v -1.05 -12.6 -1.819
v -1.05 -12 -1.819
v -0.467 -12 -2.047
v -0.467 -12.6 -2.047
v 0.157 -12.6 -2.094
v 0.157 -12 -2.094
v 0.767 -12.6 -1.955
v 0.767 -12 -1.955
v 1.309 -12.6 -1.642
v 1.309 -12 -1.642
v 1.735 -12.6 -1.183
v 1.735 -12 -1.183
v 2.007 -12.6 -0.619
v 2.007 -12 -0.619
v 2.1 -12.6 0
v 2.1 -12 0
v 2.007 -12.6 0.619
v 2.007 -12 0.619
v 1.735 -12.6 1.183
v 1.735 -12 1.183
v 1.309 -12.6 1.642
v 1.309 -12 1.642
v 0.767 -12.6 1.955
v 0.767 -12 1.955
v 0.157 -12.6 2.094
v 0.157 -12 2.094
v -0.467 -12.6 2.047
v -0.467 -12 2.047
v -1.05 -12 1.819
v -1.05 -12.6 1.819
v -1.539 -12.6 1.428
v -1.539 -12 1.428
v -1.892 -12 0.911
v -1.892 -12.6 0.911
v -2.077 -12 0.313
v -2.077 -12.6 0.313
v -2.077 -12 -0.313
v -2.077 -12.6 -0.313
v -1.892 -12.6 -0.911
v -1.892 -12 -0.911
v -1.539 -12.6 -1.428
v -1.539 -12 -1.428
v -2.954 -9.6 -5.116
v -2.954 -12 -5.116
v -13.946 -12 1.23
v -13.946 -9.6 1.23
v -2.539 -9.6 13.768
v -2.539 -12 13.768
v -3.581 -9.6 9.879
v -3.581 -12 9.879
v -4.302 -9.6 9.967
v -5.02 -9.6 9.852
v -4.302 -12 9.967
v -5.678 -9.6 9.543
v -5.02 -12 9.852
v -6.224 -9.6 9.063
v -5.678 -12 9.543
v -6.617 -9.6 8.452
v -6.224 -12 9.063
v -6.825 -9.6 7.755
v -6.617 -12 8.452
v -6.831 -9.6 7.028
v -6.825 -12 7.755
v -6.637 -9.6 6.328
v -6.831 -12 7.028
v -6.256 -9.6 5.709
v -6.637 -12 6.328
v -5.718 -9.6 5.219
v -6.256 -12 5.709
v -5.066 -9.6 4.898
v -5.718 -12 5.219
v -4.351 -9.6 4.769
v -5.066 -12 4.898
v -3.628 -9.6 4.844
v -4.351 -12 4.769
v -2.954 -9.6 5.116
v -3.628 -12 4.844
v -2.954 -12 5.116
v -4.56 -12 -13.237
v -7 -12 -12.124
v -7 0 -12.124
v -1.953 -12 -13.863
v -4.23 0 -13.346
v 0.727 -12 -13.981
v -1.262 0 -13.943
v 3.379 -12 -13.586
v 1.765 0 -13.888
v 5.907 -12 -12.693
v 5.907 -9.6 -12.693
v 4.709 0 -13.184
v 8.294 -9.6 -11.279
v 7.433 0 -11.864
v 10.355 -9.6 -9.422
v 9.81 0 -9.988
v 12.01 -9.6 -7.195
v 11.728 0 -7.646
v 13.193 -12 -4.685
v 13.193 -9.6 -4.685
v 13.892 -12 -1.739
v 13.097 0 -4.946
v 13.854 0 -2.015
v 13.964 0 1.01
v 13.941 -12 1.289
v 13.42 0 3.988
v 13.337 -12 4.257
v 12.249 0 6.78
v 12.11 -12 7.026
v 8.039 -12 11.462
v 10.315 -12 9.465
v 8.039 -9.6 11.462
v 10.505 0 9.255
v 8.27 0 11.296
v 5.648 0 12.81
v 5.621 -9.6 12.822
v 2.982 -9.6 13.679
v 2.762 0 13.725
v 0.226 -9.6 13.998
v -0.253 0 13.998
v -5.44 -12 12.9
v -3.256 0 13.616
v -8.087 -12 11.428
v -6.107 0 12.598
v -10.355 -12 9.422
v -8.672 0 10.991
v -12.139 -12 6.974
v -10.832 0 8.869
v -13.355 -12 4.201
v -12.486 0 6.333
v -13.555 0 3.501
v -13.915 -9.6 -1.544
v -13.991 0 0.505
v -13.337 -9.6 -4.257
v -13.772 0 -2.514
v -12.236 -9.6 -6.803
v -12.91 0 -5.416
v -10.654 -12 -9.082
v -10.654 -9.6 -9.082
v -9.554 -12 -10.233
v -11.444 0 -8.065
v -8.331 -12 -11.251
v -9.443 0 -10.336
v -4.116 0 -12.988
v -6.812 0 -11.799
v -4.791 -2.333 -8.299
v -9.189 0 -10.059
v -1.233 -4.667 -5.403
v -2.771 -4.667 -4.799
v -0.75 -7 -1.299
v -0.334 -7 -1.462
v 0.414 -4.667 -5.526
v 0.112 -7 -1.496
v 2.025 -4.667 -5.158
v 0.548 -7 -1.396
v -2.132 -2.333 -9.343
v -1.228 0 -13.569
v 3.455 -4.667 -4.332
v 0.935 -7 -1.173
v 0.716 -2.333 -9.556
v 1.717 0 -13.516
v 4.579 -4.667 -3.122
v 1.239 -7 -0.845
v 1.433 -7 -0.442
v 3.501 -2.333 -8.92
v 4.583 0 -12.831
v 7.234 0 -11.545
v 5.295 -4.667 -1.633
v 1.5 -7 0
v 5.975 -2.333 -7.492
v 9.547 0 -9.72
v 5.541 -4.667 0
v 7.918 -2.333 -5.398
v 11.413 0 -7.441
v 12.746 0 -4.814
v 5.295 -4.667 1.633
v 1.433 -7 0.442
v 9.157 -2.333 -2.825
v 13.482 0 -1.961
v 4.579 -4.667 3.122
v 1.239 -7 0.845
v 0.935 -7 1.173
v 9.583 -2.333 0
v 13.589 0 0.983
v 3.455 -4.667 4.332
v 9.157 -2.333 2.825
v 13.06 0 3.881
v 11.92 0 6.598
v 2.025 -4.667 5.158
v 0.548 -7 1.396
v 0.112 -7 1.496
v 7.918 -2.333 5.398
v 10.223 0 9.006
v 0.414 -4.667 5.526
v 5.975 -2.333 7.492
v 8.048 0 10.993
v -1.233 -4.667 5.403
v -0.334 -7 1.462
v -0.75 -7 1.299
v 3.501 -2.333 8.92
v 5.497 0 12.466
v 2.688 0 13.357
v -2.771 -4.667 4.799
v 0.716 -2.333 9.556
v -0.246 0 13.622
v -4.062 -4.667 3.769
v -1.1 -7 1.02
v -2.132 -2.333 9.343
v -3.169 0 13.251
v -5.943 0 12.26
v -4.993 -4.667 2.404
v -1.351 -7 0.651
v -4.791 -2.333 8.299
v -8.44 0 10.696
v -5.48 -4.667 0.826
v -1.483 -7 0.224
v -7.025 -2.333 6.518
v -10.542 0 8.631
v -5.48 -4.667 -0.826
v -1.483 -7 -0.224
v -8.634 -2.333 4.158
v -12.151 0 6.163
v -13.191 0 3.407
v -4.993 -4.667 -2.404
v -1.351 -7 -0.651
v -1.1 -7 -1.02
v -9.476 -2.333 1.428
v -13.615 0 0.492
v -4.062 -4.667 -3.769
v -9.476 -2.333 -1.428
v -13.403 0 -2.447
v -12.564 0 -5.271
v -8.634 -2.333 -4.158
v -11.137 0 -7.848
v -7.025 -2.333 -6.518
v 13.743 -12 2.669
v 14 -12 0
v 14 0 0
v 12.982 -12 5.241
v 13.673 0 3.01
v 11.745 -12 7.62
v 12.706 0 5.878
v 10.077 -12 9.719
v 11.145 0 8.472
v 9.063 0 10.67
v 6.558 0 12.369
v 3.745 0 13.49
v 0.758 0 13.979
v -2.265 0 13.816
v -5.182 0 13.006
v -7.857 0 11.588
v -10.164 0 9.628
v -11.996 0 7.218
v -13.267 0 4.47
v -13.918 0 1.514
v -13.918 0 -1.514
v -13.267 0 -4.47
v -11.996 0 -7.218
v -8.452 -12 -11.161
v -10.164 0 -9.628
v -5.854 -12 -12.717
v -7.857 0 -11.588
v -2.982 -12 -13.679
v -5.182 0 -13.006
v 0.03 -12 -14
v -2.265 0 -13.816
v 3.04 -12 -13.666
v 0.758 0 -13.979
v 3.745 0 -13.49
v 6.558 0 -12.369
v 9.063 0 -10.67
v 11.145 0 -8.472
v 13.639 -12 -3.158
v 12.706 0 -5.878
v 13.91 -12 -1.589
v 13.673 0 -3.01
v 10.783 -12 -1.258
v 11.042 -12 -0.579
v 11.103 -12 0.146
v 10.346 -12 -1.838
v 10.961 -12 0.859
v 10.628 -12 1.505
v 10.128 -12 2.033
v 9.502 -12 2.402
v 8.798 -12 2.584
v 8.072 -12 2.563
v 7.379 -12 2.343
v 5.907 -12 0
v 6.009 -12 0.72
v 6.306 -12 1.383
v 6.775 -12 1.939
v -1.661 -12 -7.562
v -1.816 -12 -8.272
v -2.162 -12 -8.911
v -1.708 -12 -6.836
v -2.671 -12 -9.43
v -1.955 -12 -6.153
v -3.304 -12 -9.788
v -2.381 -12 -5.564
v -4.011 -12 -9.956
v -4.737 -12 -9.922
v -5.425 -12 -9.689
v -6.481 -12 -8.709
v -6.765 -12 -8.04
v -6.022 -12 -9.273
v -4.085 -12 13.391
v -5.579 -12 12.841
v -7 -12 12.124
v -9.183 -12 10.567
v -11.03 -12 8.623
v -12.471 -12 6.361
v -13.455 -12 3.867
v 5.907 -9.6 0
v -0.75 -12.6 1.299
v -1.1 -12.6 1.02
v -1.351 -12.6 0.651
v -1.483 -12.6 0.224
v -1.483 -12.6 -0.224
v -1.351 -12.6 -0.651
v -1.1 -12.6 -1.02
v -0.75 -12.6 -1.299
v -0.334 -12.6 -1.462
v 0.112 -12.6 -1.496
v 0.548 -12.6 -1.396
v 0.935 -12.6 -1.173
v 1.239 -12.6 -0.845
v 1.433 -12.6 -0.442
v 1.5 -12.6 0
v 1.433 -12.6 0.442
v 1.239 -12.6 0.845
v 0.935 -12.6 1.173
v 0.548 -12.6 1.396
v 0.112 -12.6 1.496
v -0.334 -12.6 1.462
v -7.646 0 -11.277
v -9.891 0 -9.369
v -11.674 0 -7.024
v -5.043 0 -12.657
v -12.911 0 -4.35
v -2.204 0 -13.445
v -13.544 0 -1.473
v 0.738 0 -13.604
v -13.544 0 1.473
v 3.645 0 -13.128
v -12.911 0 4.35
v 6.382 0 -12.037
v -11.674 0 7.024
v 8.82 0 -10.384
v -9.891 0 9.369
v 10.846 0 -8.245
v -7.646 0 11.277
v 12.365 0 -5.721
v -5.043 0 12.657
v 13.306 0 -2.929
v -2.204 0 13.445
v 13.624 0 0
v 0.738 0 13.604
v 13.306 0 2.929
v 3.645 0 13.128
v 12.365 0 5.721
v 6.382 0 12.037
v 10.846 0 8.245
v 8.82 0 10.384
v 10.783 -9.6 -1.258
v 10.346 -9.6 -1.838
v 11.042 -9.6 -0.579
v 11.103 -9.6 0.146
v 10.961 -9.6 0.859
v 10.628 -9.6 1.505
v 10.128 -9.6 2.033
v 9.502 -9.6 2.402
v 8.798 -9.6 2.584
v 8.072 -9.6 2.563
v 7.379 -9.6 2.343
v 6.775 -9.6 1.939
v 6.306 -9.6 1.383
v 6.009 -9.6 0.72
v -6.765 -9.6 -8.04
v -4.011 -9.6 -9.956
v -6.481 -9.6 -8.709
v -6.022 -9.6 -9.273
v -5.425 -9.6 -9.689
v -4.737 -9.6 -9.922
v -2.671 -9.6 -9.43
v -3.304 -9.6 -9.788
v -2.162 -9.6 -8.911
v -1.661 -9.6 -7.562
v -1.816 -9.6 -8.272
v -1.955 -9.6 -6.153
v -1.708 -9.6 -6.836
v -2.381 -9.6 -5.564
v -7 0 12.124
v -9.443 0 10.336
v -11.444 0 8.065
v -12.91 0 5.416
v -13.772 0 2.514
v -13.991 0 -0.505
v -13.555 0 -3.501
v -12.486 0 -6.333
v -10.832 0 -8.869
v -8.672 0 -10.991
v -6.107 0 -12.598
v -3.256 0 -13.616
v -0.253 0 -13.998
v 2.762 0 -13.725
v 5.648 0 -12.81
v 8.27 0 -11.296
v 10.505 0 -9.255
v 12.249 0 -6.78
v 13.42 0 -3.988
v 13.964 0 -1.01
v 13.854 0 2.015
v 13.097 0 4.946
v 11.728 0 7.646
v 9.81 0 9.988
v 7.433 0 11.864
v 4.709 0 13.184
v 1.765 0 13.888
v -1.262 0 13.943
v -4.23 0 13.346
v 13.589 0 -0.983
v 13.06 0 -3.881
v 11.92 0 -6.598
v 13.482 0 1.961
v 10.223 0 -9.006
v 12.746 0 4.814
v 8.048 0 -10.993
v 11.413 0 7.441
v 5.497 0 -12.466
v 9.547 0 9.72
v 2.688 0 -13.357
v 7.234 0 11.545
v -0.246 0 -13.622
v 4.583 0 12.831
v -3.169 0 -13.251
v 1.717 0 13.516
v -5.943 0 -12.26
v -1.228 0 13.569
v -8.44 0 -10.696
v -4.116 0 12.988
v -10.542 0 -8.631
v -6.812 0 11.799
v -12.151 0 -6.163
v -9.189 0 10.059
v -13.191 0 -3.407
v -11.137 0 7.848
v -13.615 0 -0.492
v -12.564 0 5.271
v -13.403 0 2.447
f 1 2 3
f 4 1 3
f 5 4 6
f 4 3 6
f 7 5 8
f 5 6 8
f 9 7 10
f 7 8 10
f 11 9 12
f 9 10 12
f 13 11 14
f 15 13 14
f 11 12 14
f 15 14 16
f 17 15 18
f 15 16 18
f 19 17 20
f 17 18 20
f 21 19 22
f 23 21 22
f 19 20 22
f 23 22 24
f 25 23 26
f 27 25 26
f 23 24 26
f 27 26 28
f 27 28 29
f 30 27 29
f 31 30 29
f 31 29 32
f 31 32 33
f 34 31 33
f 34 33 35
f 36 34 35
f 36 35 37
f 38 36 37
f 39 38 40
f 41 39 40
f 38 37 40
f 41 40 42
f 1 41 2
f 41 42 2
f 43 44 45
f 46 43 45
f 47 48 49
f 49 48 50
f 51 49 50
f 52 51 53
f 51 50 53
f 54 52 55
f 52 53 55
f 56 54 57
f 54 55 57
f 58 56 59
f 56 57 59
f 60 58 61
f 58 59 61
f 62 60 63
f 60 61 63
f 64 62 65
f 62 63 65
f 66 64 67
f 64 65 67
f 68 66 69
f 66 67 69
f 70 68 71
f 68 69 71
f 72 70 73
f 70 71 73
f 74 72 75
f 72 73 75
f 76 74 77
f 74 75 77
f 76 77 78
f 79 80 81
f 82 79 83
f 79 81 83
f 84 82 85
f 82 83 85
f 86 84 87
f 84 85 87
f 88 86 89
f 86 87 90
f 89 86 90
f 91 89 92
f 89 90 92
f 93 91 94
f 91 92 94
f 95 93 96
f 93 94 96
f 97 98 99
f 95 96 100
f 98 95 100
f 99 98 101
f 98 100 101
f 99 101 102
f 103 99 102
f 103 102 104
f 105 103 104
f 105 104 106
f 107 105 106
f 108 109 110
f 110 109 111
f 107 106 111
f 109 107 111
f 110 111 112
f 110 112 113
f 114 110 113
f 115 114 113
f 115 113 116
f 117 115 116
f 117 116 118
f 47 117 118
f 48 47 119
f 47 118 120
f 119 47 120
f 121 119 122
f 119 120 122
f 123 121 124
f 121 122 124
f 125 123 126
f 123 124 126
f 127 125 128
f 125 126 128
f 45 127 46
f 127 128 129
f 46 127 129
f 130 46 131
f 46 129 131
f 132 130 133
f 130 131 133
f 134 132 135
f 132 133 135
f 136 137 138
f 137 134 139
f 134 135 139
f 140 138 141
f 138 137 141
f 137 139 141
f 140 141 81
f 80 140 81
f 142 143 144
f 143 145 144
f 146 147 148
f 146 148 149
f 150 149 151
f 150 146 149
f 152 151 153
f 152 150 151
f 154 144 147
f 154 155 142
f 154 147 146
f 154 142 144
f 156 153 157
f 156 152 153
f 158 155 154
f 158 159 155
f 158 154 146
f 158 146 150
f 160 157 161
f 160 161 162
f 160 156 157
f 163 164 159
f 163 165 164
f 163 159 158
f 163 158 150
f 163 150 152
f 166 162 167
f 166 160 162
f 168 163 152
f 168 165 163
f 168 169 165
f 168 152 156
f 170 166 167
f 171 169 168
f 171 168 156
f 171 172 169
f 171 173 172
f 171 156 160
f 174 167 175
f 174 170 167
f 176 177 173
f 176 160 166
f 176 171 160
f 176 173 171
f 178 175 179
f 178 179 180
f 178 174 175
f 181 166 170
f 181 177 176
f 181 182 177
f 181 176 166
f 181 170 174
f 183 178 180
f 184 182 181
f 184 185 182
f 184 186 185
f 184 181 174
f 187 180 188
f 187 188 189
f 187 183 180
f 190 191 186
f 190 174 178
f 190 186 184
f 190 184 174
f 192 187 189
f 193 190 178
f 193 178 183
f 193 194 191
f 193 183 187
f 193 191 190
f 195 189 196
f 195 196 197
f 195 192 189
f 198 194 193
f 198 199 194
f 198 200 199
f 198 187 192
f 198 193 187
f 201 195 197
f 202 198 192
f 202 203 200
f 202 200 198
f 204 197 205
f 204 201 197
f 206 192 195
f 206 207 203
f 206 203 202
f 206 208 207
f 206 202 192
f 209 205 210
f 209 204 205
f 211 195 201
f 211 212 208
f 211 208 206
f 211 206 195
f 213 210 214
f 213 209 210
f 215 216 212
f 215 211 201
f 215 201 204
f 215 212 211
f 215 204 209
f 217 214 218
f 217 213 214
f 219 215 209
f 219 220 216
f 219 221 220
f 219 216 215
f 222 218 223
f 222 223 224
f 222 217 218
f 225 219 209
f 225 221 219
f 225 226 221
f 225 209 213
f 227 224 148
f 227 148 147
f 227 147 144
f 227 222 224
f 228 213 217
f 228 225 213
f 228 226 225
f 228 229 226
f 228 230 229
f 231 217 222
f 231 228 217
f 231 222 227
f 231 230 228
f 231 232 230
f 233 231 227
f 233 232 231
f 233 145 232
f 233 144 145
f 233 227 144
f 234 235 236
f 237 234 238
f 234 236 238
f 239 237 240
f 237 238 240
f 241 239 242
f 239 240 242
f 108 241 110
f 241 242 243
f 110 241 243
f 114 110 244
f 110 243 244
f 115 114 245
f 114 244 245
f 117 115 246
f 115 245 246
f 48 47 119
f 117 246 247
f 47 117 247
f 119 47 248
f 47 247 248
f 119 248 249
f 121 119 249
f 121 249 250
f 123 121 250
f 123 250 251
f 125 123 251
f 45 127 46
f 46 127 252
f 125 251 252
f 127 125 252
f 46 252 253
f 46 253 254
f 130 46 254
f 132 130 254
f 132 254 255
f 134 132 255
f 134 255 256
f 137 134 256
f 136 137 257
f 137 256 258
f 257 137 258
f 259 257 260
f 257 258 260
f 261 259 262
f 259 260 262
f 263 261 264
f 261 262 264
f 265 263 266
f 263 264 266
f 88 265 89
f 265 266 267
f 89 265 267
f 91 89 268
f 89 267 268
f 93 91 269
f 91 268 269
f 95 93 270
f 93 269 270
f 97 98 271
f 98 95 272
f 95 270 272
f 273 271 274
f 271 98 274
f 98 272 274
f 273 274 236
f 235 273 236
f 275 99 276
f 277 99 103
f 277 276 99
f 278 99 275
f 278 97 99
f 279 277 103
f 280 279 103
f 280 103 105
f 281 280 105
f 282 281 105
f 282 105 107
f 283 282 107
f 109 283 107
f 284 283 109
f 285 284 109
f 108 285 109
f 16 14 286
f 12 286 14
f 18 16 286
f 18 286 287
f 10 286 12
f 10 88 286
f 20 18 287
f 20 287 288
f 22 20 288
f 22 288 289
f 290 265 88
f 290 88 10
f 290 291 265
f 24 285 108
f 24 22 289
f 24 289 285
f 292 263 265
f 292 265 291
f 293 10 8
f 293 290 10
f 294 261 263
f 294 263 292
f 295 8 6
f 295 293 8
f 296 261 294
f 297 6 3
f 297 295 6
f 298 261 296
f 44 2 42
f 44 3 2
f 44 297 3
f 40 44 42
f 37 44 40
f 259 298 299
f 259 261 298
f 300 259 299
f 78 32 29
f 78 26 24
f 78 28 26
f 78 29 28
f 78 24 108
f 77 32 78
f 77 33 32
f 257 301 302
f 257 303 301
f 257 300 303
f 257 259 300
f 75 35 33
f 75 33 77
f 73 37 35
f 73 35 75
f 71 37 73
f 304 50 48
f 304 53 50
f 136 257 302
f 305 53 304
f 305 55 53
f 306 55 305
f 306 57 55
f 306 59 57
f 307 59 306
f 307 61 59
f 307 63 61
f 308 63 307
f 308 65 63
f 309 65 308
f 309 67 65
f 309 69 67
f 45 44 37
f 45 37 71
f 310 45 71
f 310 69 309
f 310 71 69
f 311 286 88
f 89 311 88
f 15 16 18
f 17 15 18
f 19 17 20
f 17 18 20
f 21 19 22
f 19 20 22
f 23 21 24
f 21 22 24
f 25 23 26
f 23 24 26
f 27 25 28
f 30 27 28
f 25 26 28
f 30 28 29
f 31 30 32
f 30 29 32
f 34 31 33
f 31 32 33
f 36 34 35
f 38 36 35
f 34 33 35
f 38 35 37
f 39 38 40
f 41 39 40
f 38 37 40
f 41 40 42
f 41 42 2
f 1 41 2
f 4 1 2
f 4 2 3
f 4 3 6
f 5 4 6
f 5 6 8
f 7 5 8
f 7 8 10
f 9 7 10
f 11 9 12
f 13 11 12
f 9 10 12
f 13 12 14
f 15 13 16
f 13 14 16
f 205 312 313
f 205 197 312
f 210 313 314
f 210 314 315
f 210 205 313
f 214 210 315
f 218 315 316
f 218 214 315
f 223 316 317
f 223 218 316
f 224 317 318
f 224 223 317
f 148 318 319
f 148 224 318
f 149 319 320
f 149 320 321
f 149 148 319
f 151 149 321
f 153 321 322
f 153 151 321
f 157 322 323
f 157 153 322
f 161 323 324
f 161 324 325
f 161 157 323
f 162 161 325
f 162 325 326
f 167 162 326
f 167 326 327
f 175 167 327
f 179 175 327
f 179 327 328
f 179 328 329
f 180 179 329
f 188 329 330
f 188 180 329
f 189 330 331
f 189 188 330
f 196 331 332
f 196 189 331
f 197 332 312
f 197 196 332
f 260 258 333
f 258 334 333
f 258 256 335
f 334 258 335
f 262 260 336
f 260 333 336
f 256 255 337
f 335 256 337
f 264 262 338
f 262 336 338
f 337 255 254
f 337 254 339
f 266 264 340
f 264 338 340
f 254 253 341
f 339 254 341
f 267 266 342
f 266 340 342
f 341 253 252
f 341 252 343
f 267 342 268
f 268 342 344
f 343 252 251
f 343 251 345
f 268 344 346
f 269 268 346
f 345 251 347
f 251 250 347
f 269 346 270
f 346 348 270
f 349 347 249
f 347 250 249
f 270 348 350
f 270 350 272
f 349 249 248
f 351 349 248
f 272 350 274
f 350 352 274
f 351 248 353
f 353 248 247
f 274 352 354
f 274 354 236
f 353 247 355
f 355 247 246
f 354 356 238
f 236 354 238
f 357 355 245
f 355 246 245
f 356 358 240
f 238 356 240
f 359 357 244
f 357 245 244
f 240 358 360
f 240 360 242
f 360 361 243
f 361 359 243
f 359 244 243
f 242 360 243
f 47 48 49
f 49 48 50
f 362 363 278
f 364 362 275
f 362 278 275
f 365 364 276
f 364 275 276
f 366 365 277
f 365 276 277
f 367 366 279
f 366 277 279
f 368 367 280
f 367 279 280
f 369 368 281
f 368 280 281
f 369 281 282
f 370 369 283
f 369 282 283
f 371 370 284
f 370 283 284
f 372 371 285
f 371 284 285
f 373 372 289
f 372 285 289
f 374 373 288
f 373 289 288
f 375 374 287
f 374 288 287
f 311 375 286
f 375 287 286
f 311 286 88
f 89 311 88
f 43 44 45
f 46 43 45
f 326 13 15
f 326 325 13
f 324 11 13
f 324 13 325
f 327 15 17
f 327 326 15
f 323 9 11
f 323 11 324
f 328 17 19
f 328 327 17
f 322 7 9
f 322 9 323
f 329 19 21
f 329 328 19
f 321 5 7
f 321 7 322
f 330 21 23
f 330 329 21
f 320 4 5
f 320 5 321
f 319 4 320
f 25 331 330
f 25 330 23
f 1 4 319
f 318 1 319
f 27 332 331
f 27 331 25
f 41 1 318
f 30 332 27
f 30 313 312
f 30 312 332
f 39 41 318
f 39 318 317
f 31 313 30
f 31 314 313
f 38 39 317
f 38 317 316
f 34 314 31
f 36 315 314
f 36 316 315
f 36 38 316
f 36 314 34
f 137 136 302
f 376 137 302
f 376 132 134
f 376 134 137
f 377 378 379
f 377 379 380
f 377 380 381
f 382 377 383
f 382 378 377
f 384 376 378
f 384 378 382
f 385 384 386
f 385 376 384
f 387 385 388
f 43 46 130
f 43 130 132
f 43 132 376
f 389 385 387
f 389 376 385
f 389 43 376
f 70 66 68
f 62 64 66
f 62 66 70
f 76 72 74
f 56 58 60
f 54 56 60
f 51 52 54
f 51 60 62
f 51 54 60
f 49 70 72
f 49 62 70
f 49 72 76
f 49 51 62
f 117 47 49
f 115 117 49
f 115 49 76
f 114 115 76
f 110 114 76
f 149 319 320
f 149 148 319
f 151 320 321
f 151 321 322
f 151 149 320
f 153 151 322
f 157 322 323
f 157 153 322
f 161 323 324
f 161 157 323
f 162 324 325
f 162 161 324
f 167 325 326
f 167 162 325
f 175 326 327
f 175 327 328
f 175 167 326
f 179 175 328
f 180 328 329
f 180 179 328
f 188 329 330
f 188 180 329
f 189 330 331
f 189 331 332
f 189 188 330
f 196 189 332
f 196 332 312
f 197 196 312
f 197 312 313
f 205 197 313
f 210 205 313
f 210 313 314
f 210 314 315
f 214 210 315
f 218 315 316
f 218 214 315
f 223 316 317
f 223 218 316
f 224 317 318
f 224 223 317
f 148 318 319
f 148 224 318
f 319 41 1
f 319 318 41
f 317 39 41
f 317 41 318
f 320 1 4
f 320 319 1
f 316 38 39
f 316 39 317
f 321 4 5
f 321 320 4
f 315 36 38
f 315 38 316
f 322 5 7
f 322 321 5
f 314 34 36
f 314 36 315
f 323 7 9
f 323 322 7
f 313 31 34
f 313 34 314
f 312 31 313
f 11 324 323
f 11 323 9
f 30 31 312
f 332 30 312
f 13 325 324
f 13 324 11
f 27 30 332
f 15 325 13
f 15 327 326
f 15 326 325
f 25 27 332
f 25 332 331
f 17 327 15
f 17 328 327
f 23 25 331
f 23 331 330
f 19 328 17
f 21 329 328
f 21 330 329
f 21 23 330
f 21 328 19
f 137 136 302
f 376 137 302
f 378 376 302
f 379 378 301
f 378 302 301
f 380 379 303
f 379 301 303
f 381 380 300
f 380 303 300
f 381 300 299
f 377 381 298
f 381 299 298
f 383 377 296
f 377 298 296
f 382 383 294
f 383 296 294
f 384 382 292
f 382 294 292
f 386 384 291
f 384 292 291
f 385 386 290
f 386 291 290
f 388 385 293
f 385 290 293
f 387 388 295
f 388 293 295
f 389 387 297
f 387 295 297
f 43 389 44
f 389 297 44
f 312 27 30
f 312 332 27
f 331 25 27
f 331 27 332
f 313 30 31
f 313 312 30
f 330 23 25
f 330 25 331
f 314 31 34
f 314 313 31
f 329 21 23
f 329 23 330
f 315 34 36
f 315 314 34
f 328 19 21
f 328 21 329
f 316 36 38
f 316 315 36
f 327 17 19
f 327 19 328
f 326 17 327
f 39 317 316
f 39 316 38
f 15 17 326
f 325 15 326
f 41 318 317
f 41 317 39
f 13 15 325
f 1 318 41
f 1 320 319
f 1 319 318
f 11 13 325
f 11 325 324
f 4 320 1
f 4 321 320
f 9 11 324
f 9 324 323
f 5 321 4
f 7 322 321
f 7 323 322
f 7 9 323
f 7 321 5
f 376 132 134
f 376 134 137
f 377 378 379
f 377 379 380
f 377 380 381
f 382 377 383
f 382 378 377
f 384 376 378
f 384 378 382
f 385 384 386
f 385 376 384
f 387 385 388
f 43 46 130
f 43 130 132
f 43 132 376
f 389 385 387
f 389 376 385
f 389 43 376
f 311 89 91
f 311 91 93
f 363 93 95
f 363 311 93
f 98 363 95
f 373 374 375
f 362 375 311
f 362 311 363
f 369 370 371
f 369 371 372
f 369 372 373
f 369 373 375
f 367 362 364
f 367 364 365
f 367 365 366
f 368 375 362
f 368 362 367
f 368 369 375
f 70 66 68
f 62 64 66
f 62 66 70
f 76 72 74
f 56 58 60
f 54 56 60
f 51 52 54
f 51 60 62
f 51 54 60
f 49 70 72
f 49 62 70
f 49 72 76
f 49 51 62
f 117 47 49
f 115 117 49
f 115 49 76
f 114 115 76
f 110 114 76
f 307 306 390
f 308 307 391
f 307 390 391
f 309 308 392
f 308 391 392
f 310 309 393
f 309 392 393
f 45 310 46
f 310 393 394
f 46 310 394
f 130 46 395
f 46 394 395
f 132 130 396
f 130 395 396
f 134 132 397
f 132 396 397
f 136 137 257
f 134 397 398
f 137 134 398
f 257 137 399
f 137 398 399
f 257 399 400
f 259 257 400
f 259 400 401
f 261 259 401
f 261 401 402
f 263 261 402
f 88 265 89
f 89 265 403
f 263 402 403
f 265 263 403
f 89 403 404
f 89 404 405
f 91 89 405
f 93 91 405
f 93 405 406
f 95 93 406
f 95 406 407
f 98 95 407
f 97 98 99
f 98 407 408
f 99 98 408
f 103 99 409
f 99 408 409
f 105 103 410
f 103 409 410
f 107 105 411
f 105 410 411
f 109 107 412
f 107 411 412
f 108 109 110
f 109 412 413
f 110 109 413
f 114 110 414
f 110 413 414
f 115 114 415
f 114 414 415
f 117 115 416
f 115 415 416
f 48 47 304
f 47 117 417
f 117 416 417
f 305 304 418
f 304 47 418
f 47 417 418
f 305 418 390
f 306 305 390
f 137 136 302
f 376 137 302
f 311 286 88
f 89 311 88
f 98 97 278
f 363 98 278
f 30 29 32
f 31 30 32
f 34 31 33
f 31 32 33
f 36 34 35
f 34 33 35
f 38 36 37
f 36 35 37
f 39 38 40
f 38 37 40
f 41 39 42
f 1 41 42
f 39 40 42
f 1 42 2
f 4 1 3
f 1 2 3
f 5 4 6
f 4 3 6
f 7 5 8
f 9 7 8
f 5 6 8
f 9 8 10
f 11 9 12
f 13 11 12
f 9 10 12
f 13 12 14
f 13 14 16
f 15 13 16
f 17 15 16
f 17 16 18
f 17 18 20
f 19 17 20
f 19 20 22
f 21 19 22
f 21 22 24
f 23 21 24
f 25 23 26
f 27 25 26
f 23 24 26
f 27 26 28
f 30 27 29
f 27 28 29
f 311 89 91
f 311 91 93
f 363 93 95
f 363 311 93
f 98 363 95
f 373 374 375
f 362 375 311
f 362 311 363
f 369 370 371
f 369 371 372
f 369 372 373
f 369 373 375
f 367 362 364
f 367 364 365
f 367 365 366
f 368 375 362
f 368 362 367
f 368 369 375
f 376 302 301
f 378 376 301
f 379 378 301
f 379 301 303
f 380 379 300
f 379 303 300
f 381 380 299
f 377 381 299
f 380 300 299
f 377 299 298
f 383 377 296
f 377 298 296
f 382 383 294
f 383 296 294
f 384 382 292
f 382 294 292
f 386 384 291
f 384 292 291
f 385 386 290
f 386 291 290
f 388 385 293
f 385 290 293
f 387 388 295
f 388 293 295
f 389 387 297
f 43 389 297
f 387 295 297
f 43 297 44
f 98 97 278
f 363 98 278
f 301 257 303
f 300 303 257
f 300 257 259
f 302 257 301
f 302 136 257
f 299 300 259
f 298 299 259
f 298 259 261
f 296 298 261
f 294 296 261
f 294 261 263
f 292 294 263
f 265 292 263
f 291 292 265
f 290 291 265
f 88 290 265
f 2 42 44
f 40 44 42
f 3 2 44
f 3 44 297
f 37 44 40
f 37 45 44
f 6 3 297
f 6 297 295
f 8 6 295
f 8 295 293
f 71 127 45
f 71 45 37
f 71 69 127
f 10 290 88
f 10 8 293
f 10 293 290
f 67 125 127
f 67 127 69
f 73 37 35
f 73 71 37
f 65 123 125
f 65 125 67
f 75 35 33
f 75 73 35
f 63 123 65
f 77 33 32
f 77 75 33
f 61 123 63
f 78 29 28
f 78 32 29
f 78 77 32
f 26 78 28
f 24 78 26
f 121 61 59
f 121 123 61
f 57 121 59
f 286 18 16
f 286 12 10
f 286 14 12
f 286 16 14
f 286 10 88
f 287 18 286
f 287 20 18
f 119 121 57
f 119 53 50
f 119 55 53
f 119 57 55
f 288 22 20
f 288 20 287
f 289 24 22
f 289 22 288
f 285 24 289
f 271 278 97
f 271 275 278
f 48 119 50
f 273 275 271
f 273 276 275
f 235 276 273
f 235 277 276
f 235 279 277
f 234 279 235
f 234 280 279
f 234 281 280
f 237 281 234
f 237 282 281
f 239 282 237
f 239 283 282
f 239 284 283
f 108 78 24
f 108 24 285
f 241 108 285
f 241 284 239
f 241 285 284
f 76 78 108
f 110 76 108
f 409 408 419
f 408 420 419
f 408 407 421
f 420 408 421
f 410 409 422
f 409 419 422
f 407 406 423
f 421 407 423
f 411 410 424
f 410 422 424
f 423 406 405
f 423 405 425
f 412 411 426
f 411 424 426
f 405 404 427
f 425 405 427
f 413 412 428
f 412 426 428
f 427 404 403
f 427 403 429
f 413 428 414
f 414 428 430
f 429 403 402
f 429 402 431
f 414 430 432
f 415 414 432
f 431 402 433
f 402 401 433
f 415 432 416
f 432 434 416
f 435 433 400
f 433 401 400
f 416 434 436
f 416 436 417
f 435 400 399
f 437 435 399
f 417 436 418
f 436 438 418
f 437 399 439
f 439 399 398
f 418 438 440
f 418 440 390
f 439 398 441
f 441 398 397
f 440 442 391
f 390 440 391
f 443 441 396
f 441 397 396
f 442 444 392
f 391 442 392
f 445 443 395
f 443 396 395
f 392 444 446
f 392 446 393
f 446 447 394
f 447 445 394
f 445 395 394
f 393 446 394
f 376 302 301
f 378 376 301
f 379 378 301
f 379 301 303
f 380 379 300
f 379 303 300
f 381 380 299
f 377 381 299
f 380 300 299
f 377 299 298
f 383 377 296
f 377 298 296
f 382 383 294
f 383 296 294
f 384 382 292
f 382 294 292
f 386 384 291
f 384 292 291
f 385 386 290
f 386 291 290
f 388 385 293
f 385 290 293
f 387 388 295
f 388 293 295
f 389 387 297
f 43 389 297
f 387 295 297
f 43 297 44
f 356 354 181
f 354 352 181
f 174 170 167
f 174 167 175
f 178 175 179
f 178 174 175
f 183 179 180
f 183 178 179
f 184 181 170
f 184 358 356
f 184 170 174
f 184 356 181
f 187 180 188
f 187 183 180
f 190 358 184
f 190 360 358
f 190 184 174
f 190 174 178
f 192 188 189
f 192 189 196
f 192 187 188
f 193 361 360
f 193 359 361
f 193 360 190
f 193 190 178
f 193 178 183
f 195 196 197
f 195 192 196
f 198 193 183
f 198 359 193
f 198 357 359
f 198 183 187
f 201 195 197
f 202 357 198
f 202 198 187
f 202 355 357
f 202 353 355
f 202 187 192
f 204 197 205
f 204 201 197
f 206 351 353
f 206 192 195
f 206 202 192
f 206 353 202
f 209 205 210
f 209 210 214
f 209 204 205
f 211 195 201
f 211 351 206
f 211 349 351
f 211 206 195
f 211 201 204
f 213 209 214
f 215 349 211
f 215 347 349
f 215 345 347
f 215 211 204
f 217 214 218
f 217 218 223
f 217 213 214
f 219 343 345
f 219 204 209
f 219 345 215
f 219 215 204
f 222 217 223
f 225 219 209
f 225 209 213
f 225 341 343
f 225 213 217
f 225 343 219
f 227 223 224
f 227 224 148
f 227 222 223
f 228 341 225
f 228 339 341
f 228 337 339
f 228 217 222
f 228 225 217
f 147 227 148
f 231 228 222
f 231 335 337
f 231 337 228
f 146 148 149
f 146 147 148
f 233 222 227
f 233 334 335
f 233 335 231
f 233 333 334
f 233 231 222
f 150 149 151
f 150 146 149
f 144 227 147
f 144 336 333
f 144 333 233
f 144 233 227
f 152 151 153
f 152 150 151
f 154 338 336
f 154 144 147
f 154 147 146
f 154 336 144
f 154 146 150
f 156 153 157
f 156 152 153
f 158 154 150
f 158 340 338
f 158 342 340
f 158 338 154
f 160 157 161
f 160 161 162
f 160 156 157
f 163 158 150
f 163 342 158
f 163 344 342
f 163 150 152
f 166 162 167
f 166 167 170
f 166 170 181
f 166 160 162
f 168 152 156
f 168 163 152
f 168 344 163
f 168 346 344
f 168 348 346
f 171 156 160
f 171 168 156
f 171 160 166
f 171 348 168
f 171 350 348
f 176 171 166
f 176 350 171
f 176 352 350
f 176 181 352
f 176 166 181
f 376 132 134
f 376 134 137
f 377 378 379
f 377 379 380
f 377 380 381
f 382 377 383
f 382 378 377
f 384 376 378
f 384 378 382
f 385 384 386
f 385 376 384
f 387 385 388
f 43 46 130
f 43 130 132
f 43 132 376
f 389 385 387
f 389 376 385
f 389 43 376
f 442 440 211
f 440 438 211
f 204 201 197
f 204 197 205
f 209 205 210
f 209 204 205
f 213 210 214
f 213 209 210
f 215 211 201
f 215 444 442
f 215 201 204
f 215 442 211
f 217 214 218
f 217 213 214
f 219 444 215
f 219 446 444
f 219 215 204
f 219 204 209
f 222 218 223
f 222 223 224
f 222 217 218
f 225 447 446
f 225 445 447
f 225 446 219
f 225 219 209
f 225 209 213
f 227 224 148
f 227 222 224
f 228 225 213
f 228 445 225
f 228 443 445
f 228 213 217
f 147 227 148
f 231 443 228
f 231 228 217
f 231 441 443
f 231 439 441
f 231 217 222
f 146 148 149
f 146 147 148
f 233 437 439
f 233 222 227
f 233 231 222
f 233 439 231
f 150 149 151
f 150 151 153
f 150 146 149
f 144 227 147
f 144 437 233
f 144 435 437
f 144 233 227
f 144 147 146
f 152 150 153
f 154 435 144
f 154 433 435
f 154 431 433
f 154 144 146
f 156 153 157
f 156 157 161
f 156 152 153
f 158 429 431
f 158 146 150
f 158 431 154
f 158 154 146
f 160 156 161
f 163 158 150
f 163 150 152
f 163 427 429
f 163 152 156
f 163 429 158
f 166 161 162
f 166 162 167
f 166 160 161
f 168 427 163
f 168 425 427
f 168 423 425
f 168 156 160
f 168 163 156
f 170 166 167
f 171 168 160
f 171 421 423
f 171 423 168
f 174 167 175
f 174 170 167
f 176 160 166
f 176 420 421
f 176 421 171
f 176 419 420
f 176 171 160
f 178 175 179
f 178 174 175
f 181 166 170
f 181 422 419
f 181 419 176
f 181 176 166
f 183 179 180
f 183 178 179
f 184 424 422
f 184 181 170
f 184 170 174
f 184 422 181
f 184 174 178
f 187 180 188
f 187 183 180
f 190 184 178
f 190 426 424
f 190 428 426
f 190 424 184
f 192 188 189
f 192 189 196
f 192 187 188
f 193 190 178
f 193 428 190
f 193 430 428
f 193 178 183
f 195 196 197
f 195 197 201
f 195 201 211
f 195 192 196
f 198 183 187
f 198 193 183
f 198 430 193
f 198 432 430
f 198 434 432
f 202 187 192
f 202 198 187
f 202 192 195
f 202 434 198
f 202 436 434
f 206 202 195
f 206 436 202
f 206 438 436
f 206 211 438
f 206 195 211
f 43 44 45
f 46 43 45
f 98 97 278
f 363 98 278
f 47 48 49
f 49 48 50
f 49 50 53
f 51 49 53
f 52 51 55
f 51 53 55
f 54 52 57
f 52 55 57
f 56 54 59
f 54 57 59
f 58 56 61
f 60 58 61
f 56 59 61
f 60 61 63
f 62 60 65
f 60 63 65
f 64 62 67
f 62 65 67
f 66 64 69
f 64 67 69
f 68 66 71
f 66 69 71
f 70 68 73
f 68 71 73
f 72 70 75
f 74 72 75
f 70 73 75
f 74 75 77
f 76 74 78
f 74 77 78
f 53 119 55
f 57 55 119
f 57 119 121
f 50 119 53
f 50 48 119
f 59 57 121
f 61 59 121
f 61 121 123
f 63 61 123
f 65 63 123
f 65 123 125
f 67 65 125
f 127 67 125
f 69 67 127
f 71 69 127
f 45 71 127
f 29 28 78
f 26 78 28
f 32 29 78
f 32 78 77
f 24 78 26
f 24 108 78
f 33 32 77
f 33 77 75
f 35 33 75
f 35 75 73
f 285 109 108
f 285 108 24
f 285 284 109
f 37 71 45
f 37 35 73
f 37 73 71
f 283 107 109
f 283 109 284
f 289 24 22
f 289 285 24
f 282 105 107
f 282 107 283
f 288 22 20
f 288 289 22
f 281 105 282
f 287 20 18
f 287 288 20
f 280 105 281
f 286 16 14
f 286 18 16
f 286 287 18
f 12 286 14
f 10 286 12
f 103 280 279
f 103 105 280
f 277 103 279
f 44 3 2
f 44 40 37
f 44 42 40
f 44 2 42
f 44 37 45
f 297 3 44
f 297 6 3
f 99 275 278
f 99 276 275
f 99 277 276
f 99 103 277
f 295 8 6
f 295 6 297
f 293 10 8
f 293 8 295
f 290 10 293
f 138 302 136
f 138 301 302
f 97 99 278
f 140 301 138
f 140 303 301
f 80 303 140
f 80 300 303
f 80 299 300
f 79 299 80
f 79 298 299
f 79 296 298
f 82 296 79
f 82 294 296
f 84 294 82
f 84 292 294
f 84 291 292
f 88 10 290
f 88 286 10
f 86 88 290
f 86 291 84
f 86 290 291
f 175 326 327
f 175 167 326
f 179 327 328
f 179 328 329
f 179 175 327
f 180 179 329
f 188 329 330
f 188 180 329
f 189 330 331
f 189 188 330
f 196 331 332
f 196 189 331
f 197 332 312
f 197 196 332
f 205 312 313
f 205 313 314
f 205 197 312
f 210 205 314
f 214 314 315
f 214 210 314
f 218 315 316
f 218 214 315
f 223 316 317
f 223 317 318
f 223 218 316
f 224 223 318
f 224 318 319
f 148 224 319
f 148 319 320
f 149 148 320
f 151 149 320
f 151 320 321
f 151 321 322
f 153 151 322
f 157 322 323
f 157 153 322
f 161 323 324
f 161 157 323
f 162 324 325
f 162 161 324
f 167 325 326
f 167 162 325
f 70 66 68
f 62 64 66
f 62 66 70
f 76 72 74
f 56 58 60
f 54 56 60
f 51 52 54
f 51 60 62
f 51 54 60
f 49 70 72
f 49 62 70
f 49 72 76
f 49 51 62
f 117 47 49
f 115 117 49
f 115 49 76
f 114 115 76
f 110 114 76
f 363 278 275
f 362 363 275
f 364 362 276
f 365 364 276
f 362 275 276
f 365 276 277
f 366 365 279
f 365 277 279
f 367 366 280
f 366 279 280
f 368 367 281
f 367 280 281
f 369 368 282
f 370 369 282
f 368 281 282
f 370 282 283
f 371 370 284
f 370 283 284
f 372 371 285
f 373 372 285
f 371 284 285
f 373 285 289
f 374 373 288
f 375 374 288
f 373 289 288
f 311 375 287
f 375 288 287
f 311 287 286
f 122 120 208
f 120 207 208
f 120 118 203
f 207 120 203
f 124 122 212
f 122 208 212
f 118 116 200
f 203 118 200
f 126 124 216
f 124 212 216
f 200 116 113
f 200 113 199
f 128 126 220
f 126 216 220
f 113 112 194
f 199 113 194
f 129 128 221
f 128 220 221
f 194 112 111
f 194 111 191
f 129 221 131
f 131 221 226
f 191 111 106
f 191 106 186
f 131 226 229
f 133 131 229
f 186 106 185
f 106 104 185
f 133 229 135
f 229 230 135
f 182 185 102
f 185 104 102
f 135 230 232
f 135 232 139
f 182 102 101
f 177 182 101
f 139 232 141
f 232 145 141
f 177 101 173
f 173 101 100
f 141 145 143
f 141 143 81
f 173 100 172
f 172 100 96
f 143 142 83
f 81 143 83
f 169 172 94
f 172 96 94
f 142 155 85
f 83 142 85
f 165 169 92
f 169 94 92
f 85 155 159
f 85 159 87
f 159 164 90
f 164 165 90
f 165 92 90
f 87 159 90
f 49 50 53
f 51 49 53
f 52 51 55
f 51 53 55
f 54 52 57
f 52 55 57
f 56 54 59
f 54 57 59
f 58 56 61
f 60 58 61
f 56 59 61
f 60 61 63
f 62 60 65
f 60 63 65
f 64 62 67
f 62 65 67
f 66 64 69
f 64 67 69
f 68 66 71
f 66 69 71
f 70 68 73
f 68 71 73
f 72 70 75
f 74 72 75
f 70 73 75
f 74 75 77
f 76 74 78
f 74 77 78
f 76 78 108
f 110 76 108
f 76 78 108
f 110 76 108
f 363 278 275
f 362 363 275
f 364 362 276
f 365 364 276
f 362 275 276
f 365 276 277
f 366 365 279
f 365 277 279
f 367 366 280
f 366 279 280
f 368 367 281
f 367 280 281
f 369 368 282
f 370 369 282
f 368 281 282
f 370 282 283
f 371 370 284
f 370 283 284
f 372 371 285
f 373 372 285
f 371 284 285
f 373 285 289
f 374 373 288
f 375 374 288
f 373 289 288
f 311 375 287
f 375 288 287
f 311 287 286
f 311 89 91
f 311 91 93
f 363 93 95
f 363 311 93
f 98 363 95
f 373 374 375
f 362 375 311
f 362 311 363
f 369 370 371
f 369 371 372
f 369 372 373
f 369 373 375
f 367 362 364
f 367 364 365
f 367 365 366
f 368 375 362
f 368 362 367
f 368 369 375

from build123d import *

# Parameters (mm, degrees)
F0_R     = 14
F0_R_2   = 1.5
F1_DEPTH = 12
F2_SIZE2 = 12.124355653
F2_SIZE  = 7
F4_DEPTH = 1
F3_R     = 2.1
F3_R_2   = 1.5
F5_DEPTH = 0.6
F6_COUNT = 3
F7_DEPTH = 3.4


with BuildPart() as f1:
    # F0 (on Front) → F1 (new body)
    with BuildSketch(Plane.XZ):
        Circle(F0_R)
        Circle(F0_R_2, mode=Mode.SUBTRACT)
    extrude(amount=F1_DEPTH)

    # F2
    f2_edges = [f1.edges().sort_by_distance(p)[0] for p in [
        (-1.5, 0, 0),
    ]]
    f2_side = f1.faces().sort_by_distance((-1.5, -6, 0))[0]
    chamfer(f2_edges, length=F2_SIZE, length2=F2_SIZE2, reference=f2_side)

    # F3 (on face) → F4 (join)
    with BuildSketch(Plane.XZ.offset(12)):
        with BuildLine():
            Line((13.1926842468, -4.6854116536), (10.3457502244, -1.8384776311))
            ThreePointArc((10.3457502244, -1.8384776311), (9.5022495174, 2.4020867845), (5.9072725933, 0))
            Line((5.9072725933, 0), (5.9072725933, -12.6926801941))
            ThreePointArc((5.9072725933, -12.6926801941), (10.3552486785, -9.4217209047), (13.1926842468, -4.6854116536))
        make_face()
    extrude(amount=F4_DEPTH)

    # F3 (on face) → F5 (join)
    with BuildSketch(Plane.XZ.offset(12)):
        Circle(F3_R)
        Circle(F3_R_2, mode=Mode.SUBTRACT)
    extrude(amount=F5_DEPTH)


with BuildPart() as f6_1:
    # F6: instance of F1
    add(f1.part.rotate(Axis((0, -12, 0), (0, -1, 0)), 1 * 360 / F6_COUNT))


with BuildPart() as f6_2:
    # F6: instance of F1
    add(f1.part.rotate(Axis((0, -12, 0), (0, -1, 0)), 2 * 360 / F6_COUNT))


with BuildPart() as f7_tool:
    # F4_face (on face) + F6_face (on face) → F7 (new body)
    with BuildSketch(Plane(origin=(8.660490704, -13, -4.6040457016), x_dir=(1, 0, 0), z_dir=(0, -1, 0))):
        with BuildLine():
            Line((-2.7532181107, 4.6040457016), (-2.7532181107, -8.0886344924))
            ThreePointArc((-2.7532181107, -8.0886344924), (1.6947579745, -4.8176752031), (4.5321935429, -0.0813659519))
            Line((4.5321935429, -0.0813659519), (1.6852595204, 2.7655680705))
            ThreePointArc((1.6852595204, 2.7655680705), (0.8417588135, 7.0061324861), (-2.7532181107, 4.6040457016))
        make_face()
    with BuildSketch(Plane(origin=(-8.3174658898, -13, -5.1981821081), x_dir=(1, 0, 0), z_dir=(0, -1, 0))):
        with BuildLine():
            Line((5.3638295931, 0.0823339752), (-5.628353897, 6.4286740722))
            ThreePointArc((-5.628353897, 6.4286740722), (-5.0196081003, 0.9411341423), (-2.3365617528, -3.884311767))
            Line((-2.3365617528, -3.884311767), (1.5524224448, -2.8422615919))
            ThreePointArc((1.5524224448, -2.8422615919), (5.6466093085, -4.2320507594), (5.3638295931, 0.0823339752))
        make_face()
        with BuildLine():
            Line((5.3638295931, 10.3140302409), (16.3560130833, 16.660370338))
            ThreePointArc((16.3560130833, 16.660370338), (11.2992912014, 18.8769509785), (5.7788092855, 18.9660876367))
            Line((5.7788092855, 18.9660876367), (4.7367591104, 15.0771034391))
            ThreePointArc((4.7367591104, 15.0771034391), (1.4860729536, 12.226328191), (5.3638295931, 10.3140302409))
        make_face()
    extrude(amount=-F7_DEPTH)


with BuildPart() as f1_1:
    add(f1.part)

    # F7: cut by f7_tool
    add(f7_tool.part, mode=Mode.SUBTRACT)


with BuildPart() as f6_1_1:
    add(f6_1.part)

    # F7: cut by f7_tool
    add(f7_tool.part, mode=Mode.SUBTRACT)


with BuildPart() as f6_2_1:
    add(f6_2.part)

    # F7: cut by f7_tool
    add(f7_tool.part, mode=Mode.SUBTRACT)


solid = Compound([f1_1.part, f6_1_1.part, f6_2_1.part])
